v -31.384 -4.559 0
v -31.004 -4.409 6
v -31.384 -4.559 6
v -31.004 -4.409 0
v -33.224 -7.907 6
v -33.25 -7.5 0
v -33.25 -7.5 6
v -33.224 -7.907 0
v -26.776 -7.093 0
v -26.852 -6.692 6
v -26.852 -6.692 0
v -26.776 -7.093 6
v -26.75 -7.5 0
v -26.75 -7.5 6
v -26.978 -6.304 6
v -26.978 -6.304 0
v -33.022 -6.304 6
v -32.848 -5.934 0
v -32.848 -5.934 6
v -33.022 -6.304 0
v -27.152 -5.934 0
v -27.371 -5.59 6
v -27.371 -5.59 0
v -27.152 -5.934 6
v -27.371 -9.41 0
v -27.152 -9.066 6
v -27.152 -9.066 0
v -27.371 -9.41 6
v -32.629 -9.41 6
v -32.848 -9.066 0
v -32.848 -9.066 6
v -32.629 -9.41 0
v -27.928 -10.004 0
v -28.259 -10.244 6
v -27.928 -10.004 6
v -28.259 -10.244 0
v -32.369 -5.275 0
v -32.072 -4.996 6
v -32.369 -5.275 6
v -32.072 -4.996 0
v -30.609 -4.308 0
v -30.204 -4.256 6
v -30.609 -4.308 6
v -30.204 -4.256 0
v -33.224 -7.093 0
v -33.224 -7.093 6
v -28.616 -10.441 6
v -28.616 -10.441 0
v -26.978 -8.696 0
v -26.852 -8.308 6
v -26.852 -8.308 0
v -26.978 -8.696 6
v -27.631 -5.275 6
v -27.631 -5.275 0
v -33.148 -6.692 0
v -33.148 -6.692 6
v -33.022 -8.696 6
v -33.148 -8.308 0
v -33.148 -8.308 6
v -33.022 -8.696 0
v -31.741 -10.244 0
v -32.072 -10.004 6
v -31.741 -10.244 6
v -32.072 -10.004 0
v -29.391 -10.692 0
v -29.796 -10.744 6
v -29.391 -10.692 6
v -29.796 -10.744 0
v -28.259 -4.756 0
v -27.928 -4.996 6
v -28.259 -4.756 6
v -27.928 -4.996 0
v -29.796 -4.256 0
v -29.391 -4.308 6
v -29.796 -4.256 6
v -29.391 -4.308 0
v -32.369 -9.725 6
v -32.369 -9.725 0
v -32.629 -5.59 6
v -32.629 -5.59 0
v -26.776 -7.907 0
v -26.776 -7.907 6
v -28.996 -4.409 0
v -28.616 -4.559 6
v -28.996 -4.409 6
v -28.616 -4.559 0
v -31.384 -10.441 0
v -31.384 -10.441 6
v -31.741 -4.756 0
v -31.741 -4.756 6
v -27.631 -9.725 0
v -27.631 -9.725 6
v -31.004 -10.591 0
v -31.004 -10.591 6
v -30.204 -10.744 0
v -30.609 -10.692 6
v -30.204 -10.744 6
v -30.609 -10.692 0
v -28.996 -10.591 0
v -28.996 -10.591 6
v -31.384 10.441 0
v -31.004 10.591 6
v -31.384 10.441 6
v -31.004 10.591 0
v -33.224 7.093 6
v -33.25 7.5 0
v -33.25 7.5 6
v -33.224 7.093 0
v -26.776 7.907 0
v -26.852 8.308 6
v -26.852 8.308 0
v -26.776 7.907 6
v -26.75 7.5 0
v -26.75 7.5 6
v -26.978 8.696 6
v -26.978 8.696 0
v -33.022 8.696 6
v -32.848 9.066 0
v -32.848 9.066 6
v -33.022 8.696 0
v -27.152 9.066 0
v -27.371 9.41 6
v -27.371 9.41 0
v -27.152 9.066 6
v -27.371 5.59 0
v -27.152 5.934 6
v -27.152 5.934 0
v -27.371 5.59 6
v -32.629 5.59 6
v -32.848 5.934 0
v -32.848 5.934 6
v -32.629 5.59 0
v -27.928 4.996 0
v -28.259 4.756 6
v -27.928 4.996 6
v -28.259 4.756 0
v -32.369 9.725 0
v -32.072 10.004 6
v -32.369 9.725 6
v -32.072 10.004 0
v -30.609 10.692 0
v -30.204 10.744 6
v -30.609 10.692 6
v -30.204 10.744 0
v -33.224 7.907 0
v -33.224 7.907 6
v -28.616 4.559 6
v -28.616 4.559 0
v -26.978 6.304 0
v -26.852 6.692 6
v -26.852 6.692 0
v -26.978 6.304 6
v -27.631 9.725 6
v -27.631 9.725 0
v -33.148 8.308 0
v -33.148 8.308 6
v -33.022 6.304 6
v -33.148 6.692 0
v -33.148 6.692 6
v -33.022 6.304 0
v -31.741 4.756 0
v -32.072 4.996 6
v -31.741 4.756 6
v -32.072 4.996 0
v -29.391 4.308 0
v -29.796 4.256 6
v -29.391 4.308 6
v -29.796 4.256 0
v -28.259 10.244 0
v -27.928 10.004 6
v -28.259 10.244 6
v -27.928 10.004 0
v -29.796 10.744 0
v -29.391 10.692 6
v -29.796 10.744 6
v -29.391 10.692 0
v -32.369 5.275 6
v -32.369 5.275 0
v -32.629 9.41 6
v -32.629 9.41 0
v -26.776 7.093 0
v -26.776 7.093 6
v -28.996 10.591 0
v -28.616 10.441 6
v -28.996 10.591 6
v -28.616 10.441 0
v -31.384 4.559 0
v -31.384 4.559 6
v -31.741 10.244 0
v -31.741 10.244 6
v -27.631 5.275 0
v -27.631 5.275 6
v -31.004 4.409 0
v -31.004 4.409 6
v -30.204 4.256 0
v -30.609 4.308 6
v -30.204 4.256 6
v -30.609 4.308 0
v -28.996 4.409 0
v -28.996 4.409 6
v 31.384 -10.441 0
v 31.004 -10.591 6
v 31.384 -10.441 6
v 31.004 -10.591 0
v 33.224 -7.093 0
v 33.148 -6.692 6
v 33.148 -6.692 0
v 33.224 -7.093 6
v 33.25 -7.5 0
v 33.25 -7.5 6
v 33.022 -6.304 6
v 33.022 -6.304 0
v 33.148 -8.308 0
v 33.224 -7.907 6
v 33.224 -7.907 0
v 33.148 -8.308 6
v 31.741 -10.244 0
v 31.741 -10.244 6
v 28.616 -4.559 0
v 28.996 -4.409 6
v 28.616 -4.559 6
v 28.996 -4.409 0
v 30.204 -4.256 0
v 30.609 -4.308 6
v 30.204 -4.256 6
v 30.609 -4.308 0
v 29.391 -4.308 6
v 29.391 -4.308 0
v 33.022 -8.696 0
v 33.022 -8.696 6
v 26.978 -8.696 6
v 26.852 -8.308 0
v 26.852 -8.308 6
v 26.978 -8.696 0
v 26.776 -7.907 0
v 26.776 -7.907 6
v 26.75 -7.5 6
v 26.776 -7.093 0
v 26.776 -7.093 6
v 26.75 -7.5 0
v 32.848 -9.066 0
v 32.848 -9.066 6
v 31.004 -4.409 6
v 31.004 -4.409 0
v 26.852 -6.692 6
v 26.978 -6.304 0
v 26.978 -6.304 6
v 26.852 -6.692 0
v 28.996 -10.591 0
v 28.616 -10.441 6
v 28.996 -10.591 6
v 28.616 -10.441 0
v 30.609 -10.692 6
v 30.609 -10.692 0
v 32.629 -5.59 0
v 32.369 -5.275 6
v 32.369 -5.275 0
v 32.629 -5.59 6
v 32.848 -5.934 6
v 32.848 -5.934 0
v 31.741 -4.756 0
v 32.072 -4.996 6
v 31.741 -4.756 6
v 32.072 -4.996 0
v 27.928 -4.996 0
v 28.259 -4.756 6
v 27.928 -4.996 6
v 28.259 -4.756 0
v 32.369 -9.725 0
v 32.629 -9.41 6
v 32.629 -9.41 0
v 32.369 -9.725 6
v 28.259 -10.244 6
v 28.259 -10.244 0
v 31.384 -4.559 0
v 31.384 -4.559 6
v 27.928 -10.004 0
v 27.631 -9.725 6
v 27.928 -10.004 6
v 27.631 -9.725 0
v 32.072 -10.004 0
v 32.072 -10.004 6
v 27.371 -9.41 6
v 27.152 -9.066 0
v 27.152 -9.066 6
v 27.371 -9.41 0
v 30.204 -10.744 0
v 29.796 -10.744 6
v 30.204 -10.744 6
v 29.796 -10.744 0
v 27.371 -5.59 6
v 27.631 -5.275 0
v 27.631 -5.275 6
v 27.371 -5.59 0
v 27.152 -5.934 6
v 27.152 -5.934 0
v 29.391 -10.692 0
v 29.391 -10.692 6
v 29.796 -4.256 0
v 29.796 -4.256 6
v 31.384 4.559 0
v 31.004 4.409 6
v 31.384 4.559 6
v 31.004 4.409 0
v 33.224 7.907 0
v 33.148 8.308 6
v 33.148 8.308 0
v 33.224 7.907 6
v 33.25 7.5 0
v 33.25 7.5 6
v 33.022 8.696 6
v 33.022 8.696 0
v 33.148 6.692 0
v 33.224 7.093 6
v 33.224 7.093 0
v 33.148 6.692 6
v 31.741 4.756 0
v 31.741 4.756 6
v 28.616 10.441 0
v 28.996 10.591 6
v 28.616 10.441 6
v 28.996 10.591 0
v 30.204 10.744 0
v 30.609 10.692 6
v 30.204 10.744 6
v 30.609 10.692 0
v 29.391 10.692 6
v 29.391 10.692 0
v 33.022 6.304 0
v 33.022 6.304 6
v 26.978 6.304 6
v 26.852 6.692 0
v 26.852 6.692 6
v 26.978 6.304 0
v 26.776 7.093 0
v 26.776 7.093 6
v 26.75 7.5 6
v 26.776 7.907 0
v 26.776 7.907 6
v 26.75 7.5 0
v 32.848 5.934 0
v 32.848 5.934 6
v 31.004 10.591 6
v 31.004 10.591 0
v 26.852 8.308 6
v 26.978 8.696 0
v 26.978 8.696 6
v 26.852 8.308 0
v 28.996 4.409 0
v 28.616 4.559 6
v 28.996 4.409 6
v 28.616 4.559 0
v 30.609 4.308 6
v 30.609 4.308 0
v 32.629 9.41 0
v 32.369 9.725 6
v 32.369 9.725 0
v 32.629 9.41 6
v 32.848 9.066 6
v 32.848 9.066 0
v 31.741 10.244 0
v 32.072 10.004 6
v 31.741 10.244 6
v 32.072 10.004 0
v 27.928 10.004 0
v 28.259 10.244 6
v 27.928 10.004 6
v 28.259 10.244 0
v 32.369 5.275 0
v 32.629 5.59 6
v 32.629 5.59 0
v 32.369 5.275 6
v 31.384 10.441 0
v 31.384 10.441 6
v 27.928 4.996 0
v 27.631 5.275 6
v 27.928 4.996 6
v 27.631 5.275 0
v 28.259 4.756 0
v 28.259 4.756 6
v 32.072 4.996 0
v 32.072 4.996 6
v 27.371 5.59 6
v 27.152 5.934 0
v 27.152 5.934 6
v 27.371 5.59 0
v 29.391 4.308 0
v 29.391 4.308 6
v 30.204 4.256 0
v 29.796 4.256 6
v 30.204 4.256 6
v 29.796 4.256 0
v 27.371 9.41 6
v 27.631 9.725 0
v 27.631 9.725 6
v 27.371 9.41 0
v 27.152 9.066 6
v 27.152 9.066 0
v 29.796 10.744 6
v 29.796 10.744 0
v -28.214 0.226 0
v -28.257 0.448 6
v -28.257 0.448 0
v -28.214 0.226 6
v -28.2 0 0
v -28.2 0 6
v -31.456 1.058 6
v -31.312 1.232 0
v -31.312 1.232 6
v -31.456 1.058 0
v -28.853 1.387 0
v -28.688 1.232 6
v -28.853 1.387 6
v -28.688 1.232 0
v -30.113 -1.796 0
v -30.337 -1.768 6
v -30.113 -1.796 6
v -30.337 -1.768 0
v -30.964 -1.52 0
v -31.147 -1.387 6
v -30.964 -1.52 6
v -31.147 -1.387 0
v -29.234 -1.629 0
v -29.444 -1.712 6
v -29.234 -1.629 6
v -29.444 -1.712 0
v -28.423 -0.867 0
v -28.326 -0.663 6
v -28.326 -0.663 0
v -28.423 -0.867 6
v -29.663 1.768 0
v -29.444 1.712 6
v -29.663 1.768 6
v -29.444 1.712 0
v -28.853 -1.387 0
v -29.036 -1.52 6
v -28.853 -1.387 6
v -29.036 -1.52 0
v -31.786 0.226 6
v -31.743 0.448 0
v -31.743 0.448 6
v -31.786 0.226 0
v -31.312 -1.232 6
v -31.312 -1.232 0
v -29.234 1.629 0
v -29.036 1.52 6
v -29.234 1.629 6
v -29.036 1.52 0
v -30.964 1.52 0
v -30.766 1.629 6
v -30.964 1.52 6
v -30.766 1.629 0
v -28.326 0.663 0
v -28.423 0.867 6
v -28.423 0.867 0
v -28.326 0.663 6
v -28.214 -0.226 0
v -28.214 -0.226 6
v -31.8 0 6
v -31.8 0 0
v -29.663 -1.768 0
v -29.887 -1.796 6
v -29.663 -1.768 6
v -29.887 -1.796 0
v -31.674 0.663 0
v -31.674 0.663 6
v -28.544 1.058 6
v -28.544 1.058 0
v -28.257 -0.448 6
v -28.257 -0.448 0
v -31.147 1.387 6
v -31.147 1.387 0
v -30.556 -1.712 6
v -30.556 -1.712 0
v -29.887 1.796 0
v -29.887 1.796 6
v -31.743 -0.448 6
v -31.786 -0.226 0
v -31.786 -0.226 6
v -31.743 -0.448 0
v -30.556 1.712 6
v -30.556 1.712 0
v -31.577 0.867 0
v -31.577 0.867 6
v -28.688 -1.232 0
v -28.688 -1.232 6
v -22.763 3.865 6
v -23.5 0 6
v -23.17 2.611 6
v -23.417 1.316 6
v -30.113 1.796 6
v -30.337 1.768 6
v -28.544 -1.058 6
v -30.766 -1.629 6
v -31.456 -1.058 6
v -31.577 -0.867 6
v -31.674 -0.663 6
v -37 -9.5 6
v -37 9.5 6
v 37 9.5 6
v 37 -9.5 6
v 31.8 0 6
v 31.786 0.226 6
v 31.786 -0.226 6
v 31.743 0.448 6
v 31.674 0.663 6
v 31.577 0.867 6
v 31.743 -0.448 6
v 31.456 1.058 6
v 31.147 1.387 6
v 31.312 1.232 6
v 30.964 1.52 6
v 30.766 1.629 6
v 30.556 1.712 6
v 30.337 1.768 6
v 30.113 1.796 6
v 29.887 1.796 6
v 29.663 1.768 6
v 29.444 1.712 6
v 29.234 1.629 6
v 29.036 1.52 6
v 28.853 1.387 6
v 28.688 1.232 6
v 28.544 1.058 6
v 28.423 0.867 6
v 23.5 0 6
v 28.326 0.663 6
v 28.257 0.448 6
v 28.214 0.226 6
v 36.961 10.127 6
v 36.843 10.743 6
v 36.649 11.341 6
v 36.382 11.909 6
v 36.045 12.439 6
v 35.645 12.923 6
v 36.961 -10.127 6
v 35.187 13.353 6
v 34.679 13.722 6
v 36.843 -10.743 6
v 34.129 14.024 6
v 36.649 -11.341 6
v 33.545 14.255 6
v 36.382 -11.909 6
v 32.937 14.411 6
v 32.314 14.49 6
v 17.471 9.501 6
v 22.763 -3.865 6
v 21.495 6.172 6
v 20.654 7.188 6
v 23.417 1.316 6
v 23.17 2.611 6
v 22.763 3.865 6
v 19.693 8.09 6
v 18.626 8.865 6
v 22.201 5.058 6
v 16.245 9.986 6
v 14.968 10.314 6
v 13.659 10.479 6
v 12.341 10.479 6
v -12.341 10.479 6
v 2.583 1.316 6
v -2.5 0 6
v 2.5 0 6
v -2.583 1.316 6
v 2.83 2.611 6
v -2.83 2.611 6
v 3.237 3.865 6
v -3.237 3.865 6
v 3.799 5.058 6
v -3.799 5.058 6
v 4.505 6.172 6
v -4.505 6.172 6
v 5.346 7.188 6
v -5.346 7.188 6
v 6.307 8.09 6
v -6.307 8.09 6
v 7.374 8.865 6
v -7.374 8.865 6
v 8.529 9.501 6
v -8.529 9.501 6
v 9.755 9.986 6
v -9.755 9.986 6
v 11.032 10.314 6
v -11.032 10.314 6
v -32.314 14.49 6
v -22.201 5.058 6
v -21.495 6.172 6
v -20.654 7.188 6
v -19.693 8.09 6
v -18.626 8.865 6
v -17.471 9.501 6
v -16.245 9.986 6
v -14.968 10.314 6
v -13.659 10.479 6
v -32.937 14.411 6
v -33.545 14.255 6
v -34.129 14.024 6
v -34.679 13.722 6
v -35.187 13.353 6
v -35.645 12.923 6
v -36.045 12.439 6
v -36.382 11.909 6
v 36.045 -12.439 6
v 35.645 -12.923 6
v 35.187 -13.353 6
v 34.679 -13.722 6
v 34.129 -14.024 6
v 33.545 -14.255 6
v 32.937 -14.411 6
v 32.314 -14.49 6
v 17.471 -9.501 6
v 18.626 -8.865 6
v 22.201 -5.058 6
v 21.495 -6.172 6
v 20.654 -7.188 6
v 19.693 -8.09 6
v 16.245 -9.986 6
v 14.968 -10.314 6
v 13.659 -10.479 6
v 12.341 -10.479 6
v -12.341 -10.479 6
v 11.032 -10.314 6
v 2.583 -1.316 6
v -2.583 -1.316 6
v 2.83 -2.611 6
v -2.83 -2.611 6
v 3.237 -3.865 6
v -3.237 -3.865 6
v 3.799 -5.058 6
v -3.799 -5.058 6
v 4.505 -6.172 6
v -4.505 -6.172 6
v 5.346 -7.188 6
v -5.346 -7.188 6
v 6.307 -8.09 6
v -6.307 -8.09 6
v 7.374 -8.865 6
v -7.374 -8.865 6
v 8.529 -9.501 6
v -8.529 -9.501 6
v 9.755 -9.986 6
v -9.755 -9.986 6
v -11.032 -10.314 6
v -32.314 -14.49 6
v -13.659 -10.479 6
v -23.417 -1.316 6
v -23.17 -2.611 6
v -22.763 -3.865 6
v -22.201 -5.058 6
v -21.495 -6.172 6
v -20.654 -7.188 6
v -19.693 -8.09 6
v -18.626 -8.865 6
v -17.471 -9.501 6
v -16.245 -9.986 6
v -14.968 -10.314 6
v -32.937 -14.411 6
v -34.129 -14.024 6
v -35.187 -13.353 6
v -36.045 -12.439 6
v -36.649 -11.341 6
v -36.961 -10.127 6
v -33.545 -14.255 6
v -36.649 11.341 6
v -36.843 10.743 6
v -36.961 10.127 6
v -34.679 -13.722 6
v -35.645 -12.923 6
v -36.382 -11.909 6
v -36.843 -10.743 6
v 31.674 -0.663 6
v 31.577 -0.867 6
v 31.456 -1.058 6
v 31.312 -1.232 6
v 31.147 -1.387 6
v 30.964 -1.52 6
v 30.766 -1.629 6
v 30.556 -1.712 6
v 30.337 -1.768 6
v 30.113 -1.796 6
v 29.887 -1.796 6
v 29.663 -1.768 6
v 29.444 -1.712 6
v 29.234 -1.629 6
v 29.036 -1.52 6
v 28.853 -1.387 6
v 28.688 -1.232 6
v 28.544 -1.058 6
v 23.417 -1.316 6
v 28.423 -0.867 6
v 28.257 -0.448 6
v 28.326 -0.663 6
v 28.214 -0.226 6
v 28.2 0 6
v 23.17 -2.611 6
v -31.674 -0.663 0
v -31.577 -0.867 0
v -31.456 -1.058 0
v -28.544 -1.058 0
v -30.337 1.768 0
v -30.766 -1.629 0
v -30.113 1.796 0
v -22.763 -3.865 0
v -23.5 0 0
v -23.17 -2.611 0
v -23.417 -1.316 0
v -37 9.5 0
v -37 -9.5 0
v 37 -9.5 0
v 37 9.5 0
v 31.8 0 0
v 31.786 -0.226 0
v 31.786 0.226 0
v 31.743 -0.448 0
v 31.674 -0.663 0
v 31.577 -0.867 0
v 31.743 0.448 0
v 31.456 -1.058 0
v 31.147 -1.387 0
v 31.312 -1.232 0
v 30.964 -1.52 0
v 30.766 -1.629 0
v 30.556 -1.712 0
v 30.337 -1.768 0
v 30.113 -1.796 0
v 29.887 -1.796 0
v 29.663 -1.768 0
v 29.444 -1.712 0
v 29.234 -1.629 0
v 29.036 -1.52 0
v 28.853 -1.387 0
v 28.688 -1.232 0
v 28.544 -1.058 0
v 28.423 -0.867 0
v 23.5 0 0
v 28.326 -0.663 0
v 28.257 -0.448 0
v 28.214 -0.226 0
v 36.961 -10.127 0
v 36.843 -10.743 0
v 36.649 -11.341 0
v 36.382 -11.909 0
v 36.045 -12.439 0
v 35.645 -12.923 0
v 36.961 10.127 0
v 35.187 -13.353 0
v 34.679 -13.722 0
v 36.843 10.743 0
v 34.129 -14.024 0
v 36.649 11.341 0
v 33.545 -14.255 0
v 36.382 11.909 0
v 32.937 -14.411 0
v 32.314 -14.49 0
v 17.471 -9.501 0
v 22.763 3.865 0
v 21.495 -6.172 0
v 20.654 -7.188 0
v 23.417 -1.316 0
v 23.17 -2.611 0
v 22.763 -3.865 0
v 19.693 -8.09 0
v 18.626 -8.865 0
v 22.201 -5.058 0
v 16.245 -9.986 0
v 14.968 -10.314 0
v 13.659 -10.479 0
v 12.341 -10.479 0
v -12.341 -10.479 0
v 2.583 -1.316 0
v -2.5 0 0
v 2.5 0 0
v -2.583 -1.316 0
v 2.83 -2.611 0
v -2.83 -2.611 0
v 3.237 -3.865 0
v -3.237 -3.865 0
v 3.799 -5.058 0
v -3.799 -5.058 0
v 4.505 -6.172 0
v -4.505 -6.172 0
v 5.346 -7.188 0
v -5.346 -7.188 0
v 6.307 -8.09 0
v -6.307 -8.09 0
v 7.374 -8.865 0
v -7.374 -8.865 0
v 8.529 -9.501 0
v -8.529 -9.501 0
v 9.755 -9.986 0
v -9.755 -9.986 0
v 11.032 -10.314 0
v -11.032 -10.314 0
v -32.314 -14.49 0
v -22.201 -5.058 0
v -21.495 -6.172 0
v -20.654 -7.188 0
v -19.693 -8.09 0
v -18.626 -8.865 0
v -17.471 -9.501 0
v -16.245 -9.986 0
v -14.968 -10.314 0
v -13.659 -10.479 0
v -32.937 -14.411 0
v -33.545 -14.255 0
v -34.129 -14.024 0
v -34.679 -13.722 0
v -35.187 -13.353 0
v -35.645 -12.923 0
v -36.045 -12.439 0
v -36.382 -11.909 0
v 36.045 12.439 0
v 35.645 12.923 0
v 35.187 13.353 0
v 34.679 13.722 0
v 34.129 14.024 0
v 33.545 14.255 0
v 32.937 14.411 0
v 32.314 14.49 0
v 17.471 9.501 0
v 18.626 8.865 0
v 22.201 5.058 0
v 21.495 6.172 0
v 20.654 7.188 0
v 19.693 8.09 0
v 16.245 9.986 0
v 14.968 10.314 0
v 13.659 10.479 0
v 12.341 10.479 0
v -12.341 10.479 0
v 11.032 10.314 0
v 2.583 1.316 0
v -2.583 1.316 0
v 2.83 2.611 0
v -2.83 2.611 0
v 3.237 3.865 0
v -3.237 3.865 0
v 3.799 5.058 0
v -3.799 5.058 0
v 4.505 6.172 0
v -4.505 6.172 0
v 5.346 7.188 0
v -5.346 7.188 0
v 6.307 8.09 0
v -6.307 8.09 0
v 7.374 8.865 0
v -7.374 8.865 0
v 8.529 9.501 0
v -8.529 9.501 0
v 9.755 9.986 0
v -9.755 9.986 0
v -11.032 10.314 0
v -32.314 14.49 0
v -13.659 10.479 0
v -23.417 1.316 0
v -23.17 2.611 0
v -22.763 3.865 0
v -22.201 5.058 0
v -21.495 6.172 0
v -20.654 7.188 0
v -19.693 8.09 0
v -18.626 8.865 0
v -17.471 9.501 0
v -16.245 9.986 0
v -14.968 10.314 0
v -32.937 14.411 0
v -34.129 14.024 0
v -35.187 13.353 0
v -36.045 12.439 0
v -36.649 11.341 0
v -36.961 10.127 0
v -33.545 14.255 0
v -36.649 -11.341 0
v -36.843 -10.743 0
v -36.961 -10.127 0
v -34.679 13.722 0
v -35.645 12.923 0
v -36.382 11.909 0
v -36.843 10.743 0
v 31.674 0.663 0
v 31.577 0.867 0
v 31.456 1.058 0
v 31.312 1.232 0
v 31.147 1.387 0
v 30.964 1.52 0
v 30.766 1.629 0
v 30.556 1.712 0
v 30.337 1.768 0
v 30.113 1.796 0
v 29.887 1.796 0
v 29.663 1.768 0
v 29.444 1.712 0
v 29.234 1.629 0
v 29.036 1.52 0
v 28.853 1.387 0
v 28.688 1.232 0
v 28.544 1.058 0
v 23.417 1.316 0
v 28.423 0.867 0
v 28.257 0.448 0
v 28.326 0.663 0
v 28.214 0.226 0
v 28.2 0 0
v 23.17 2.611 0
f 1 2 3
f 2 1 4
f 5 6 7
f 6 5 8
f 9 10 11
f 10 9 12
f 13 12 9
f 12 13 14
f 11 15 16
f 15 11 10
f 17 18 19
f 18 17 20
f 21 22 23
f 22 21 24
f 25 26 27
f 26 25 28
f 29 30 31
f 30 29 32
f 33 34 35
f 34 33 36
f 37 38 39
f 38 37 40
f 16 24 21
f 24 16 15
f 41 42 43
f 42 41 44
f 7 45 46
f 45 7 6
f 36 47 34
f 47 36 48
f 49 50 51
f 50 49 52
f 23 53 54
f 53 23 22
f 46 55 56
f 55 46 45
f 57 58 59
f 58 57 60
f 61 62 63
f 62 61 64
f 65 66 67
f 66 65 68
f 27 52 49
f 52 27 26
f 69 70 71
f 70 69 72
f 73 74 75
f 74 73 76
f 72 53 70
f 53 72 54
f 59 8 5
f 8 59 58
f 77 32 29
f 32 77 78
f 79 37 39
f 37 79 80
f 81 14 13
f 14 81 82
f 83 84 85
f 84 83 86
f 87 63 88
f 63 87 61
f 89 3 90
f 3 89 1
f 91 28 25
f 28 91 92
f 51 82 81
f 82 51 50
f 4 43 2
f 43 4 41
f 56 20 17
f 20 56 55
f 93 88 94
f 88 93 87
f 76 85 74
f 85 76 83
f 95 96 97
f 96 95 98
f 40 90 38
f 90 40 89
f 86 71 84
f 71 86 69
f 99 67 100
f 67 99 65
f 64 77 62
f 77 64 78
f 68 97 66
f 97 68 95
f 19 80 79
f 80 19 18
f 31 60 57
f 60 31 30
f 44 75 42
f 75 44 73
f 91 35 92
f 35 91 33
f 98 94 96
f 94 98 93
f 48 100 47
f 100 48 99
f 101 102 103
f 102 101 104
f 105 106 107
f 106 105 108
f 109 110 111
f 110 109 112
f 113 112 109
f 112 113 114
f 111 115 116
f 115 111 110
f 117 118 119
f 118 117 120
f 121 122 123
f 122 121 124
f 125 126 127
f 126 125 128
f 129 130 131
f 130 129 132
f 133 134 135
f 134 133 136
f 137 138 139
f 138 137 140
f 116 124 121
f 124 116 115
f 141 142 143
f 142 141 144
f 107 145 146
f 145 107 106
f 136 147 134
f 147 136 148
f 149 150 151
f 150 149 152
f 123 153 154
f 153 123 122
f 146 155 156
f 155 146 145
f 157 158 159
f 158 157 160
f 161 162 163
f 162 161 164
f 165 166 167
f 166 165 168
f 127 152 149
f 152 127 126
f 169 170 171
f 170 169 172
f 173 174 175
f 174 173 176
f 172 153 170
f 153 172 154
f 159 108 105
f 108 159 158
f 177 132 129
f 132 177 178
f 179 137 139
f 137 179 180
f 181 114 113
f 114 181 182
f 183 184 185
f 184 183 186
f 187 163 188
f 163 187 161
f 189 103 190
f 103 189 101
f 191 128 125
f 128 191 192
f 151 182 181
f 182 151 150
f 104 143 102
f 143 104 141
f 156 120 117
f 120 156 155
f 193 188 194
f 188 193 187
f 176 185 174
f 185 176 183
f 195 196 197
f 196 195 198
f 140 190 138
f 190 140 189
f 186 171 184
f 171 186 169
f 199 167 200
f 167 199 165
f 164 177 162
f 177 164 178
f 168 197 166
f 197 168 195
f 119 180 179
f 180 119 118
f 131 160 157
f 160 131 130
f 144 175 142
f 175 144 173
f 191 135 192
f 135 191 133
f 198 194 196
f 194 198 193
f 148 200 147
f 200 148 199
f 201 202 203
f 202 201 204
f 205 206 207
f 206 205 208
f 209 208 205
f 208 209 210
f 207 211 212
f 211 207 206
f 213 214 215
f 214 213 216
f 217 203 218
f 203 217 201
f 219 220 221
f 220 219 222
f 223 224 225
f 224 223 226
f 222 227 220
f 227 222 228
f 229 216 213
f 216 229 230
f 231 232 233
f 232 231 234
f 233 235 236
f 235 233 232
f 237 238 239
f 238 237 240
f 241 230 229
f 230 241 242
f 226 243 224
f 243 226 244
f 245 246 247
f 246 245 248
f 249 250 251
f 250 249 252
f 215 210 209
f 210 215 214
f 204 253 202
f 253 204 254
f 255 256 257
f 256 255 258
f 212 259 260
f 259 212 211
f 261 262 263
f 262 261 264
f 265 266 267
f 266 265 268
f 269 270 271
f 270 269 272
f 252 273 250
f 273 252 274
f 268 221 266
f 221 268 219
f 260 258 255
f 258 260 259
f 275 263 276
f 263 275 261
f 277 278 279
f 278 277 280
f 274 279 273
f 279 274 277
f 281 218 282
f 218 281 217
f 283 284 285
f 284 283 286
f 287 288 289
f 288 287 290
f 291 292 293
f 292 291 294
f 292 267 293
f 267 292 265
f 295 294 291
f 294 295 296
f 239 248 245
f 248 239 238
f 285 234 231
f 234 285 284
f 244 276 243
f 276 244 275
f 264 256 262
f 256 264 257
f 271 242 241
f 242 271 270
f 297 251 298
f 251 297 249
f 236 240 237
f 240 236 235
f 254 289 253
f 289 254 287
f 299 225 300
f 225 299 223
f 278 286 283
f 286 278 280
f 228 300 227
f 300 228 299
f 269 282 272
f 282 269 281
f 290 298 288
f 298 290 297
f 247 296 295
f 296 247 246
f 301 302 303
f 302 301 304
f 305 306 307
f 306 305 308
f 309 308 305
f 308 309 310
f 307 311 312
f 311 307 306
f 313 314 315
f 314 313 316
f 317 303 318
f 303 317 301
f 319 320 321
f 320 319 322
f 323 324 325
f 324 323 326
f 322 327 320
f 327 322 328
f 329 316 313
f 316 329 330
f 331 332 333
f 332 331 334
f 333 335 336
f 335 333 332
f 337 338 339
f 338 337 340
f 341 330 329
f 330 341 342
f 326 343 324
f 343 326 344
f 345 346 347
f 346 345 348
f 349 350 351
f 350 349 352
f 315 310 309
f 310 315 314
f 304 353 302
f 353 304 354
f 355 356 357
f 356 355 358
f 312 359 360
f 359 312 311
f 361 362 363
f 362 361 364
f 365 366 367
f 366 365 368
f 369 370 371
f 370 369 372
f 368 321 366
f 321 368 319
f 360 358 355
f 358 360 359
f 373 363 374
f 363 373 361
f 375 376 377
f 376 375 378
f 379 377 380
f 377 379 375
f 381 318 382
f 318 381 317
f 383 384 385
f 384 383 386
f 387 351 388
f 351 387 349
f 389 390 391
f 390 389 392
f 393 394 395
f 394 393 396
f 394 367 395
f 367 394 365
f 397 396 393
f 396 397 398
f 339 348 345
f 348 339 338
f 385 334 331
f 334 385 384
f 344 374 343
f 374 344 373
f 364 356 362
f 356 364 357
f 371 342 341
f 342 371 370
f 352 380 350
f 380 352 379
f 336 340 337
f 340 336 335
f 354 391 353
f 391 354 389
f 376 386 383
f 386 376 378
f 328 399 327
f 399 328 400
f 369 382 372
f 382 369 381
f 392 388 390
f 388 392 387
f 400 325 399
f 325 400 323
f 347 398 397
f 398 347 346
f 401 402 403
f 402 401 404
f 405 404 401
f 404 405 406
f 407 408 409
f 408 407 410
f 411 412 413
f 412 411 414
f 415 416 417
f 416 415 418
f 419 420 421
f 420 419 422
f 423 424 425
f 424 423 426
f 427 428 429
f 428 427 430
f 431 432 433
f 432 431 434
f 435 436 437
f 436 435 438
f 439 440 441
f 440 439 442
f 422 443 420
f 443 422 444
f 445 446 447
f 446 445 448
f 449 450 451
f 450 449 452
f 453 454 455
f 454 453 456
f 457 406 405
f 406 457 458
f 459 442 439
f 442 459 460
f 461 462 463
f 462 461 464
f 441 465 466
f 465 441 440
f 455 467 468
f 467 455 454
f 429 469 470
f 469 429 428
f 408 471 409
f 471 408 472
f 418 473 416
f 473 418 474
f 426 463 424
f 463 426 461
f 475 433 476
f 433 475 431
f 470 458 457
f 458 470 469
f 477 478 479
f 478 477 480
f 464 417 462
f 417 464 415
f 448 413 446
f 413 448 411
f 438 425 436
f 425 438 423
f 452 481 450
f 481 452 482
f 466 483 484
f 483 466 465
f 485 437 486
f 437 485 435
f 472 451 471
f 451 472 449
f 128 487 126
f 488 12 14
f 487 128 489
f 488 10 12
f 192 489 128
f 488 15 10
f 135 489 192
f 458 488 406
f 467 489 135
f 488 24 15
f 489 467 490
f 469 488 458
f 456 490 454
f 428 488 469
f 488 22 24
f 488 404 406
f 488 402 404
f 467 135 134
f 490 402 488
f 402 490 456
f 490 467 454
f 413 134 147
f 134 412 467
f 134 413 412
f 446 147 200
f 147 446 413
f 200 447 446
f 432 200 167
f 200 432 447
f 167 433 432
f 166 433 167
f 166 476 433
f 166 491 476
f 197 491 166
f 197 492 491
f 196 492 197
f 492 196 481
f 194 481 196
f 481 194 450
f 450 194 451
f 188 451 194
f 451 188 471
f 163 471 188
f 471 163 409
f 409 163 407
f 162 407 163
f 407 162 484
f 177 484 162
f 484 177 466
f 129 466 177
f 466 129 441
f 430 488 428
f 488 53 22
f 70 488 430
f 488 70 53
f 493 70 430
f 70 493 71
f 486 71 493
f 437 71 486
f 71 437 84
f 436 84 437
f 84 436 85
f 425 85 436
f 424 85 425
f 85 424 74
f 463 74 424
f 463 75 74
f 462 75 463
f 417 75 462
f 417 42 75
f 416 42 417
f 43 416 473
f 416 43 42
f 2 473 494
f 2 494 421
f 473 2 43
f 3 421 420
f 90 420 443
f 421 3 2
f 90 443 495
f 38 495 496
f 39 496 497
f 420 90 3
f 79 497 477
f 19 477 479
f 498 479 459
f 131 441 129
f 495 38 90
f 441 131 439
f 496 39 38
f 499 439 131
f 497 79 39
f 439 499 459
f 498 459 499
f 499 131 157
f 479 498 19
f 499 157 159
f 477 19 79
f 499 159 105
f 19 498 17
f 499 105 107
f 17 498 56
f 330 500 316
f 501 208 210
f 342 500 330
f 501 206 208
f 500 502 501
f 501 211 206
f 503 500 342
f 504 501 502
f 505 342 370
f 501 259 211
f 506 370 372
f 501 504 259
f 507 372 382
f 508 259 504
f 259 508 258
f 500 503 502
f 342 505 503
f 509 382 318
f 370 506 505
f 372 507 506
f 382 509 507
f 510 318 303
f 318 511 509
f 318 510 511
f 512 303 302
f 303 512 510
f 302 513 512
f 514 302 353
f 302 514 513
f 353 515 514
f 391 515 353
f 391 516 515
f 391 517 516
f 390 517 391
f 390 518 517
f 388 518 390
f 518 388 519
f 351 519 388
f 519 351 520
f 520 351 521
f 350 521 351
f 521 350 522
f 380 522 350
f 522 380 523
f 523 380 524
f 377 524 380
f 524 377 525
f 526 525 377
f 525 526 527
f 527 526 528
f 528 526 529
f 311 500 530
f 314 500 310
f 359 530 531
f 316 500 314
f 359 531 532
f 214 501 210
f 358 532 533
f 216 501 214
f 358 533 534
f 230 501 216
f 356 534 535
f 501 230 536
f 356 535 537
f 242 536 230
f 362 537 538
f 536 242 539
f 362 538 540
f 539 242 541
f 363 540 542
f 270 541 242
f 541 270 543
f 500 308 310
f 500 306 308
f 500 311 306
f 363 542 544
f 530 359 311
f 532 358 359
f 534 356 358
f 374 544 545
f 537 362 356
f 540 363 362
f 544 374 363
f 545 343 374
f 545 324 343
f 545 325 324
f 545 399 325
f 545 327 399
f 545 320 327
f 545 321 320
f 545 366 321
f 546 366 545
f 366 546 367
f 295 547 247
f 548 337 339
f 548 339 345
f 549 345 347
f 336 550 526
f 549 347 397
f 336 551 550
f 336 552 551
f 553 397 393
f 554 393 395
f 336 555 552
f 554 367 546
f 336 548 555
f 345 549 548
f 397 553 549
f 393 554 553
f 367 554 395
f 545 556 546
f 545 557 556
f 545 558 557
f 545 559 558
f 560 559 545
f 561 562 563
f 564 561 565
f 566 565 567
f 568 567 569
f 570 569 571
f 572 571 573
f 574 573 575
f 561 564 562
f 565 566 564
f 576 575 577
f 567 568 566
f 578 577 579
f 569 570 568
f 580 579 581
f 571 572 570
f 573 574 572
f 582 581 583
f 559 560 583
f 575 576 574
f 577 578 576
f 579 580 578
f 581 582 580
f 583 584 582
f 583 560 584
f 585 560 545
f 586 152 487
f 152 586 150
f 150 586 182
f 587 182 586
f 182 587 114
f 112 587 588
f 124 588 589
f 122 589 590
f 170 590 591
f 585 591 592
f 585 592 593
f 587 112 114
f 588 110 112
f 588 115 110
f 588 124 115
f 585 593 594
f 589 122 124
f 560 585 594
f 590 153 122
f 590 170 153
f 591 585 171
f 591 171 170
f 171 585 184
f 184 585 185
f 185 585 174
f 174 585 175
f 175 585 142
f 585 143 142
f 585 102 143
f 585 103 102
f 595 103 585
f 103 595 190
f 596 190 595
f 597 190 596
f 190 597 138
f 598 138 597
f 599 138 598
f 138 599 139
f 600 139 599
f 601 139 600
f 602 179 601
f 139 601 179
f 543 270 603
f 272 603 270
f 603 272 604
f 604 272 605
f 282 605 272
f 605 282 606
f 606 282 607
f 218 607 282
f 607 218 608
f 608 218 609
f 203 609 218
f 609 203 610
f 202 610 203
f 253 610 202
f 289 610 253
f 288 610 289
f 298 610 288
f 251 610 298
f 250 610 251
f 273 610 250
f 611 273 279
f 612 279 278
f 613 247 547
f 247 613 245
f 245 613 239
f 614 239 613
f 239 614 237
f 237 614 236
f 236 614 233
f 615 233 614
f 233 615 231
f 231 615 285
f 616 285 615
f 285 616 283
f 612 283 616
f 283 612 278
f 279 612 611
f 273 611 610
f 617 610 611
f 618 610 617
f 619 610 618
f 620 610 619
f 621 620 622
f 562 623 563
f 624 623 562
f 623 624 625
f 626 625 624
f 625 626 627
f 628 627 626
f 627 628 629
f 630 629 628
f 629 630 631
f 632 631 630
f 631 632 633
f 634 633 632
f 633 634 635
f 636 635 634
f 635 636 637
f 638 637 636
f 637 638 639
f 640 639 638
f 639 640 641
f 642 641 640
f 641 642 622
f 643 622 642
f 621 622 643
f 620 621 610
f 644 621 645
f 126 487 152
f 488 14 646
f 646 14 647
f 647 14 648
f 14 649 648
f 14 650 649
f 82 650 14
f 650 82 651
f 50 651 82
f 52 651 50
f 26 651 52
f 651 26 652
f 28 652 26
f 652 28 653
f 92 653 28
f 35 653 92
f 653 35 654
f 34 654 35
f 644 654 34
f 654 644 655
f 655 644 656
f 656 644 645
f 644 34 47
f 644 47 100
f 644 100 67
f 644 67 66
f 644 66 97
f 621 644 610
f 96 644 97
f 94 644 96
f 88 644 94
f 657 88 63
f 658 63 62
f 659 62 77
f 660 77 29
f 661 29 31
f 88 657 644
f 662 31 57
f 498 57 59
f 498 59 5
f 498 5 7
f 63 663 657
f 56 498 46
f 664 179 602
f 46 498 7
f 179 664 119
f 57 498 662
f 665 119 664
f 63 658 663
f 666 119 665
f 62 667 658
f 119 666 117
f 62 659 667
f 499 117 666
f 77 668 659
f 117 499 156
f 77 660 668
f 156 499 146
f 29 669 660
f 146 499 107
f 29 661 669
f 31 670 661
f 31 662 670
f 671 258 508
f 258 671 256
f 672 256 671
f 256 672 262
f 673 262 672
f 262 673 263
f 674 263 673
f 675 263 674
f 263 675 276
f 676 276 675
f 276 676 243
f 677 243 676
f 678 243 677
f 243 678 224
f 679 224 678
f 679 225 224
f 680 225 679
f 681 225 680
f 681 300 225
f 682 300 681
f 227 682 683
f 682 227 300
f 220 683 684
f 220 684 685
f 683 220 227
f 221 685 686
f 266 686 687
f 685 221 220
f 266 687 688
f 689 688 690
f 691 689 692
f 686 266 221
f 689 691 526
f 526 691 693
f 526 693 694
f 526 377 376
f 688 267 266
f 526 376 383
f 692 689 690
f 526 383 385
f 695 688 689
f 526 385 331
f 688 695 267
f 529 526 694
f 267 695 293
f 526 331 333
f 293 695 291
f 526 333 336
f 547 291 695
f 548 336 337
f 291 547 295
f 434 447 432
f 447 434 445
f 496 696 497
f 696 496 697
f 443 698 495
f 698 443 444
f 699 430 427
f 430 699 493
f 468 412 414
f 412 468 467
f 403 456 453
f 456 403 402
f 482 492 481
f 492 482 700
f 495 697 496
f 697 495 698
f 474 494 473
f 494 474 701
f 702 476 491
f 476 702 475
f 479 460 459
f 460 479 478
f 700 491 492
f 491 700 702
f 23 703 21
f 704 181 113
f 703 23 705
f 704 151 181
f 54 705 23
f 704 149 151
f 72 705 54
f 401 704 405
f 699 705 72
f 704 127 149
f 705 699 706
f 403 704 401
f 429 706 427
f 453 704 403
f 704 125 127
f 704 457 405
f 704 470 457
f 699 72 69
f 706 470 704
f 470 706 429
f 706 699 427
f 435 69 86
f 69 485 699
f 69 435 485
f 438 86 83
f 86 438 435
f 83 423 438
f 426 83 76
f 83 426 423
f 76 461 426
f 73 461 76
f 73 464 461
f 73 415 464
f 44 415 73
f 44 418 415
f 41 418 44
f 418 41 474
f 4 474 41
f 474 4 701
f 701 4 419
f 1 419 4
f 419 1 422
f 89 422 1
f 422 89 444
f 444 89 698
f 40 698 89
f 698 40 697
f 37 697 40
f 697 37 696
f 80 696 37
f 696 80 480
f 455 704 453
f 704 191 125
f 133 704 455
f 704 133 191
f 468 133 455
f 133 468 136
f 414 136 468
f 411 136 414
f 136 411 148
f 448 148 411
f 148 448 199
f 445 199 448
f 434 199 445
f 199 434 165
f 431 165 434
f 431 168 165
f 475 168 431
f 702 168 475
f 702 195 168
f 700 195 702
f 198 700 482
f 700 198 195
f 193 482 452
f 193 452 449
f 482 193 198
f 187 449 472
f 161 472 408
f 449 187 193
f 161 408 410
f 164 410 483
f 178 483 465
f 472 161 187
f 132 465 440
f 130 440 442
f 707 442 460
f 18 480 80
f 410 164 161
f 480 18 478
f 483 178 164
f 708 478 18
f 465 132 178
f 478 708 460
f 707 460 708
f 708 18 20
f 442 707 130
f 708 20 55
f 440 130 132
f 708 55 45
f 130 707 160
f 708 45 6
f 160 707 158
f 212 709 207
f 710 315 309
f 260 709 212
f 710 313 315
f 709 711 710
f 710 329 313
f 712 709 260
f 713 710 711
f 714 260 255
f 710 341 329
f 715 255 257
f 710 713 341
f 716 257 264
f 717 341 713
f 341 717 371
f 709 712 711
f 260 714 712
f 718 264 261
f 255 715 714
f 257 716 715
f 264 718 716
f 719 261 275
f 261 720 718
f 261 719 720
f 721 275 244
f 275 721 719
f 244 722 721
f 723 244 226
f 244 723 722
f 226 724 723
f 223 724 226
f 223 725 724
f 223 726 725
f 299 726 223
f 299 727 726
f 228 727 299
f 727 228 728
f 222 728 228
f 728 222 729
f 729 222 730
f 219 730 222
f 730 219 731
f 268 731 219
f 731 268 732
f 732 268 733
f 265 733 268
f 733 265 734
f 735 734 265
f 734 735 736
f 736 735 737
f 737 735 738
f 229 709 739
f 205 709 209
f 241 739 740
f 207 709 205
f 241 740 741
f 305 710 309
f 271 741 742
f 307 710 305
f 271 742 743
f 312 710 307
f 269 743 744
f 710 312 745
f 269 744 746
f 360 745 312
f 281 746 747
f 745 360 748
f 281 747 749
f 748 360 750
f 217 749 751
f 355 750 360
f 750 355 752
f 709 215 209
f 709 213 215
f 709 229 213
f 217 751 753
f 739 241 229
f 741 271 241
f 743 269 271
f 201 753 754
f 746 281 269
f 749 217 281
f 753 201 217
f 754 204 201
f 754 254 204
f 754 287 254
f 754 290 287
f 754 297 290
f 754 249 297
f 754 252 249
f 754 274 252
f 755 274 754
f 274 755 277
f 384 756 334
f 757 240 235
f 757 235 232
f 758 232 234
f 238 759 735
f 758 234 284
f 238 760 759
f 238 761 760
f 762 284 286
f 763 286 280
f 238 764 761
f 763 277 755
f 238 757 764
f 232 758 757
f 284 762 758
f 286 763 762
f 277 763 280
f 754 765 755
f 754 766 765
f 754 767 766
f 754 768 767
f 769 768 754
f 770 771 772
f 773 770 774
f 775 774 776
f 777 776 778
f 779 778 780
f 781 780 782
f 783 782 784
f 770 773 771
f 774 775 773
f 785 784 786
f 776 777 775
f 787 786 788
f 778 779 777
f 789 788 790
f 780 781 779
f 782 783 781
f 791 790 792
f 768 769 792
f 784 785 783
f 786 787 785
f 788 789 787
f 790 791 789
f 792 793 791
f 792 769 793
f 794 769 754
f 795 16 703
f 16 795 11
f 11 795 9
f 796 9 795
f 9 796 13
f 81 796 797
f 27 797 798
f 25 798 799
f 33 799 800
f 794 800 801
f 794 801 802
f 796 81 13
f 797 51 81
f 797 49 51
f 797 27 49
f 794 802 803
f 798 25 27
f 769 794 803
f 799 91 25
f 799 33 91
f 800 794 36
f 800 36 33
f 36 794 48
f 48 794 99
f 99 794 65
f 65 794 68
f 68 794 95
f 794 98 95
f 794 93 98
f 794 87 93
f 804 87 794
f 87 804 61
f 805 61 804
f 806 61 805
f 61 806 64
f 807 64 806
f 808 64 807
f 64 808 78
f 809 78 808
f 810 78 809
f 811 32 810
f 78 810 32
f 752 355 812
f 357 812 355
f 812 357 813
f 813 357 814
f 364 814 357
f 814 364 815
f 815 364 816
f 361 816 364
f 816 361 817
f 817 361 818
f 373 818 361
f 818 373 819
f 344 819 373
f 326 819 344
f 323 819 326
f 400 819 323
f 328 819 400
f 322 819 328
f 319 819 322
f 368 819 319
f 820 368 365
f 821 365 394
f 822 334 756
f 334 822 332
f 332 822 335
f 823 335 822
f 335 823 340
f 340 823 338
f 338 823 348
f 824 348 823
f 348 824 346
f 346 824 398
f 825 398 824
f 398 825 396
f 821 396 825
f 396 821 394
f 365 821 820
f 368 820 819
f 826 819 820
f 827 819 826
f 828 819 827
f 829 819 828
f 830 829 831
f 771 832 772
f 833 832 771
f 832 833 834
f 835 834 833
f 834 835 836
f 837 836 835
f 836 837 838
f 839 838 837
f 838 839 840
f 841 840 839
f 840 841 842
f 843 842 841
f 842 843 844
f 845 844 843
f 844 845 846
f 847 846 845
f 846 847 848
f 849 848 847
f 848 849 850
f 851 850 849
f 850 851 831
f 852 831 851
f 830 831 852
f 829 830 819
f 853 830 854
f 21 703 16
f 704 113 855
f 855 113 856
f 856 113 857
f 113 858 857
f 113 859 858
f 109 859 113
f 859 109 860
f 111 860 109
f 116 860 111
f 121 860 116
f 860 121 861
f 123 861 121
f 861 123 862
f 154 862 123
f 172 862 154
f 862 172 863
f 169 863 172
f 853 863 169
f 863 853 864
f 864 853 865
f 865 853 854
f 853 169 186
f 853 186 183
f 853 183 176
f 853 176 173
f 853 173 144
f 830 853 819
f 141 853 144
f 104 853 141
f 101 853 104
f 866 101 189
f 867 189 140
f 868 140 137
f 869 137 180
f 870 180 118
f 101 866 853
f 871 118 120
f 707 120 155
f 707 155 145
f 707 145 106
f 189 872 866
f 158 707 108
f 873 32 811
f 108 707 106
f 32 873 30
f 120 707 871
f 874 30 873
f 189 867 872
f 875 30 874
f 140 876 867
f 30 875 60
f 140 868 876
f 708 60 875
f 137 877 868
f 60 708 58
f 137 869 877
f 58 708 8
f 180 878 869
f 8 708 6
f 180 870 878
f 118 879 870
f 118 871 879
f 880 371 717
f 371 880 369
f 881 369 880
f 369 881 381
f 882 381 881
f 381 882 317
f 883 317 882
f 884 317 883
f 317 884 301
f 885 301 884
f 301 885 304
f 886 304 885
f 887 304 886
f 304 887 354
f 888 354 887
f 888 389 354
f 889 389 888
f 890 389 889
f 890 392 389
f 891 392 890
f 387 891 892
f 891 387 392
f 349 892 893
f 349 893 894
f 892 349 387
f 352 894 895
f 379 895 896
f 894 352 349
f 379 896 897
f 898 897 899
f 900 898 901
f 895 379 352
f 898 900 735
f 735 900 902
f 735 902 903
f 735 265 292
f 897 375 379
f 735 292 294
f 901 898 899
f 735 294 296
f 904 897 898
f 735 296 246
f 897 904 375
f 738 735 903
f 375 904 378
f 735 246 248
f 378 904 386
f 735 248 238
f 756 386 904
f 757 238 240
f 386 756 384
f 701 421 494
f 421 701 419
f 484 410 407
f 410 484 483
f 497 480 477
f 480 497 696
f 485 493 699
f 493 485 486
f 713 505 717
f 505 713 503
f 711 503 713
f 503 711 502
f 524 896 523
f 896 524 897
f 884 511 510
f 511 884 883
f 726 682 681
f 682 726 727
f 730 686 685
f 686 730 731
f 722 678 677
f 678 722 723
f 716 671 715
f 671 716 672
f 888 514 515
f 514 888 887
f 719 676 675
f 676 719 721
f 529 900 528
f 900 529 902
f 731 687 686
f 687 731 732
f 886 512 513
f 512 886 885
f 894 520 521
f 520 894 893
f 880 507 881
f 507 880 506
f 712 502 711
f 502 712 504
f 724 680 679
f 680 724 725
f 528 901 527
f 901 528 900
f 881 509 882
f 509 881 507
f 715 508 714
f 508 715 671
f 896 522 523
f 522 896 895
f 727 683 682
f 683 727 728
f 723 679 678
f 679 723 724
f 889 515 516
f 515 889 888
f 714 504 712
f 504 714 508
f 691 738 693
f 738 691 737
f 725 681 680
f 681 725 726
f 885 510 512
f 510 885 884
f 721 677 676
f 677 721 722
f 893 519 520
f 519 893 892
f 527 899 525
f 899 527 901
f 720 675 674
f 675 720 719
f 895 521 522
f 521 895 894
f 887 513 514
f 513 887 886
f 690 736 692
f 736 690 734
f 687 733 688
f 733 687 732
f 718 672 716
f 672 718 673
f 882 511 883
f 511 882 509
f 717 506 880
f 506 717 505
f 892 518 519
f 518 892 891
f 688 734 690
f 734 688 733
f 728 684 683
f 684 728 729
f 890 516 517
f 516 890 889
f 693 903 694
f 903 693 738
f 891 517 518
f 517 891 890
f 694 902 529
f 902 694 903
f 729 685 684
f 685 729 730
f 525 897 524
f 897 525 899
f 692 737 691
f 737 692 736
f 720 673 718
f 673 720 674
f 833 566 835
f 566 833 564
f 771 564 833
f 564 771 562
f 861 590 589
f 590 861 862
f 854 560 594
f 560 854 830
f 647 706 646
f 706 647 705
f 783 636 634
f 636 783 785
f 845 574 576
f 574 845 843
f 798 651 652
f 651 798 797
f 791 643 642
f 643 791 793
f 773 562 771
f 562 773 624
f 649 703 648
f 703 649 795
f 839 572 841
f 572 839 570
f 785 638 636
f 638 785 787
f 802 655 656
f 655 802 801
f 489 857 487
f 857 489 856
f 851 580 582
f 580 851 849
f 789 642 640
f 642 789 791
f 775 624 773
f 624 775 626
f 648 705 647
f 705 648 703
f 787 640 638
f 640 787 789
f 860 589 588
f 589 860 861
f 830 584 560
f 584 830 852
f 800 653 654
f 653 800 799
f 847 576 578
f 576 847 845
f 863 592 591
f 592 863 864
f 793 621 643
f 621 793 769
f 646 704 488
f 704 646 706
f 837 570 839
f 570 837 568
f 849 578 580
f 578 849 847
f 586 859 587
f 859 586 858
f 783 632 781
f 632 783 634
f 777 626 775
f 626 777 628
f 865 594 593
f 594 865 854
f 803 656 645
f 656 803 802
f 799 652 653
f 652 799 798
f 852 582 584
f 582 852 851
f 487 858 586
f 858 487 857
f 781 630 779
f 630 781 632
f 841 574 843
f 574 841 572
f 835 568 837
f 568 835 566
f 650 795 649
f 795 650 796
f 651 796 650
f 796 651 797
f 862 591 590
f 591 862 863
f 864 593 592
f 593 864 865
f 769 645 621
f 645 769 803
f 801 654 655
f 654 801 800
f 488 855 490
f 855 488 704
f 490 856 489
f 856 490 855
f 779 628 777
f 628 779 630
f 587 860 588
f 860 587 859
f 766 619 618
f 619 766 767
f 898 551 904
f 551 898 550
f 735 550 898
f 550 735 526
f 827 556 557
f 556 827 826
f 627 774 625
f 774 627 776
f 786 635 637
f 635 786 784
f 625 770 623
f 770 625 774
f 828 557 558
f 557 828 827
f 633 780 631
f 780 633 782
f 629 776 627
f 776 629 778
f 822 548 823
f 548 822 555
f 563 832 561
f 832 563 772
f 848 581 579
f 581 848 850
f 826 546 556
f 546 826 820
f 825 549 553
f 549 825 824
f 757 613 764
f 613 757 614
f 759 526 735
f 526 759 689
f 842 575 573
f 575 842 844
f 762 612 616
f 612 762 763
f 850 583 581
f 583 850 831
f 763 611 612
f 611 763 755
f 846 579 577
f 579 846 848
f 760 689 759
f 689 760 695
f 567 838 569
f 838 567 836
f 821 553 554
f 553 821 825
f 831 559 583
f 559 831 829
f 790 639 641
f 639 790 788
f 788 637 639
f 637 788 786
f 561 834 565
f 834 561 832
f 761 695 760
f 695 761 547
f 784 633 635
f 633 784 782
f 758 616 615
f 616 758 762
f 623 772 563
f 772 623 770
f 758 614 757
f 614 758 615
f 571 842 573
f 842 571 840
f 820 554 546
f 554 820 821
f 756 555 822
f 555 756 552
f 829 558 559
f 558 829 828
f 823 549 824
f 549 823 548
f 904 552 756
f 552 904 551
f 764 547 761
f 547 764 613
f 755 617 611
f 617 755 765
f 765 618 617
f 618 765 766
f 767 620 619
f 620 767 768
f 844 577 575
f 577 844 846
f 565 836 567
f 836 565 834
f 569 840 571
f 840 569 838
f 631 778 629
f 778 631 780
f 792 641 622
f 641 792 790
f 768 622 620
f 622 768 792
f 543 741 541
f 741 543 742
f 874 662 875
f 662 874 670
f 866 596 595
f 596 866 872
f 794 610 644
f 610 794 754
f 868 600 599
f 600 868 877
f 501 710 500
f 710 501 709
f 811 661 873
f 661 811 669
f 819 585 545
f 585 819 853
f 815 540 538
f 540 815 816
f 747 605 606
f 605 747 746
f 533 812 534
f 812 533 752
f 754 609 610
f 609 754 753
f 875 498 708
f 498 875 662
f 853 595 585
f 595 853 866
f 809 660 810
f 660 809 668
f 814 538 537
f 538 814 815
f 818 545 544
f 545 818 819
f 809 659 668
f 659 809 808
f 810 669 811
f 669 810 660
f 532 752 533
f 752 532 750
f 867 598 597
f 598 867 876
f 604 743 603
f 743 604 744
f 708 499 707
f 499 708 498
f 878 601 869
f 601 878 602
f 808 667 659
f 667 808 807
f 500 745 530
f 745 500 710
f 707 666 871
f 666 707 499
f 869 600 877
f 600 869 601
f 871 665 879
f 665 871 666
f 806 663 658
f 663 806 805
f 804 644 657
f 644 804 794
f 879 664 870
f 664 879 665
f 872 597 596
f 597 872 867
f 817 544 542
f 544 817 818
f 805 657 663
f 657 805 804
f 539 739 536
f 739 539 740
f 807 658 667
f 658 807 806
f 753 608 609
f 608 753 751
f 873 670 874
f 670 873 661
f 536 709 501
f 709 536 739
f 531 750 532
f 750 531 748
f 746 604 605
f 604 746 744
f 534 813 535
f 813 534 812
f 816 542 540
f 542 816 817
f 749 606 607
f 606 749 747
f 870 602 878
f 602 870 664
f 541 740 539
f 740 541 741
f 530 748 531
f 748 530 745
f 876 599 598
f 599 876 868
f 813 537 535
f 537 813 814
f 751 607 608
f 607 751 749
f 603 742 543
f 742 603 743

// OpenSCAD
$fn = 50;


difference() {
	union() {
		hull() {
			translate(v = [-32.0000000000, 9.5000000000, 0]) {
				cylinder(h = 6, r = 5);
			}
			translate(v = [32.0000000000, 9.5000000000, 0]) {
				cylinder(h = 6, r = 5);
			}
			translate(v = [-32.0000000000, -9.5000000000, 0]) {
				cylinder(h = 6, r = 5);
			}
			translate(v = [32.0000000000, -9.5000000000, 0]) {
				cylinder(h = 6, r = 5);
			}
		}
	}
	union() {
		#translate(v = [-30.0000000000, -7.5000000000, 0]) {
			cylinder(h = 6, r = 3.2500000000);
		}
		#translate(v = [-30.0000000000, 7.5000000000, 0]) {
			cylinder(h = 6, r = 3.2500000000);
		}
		#translate(v = [30.0000000000, -7.5000000000, 0]) {
			cylinder(h = 6, r = 3.2500000000);
		}
		#translate(v = [30.0000000000, 7.5000000000, 0]) {
			cylinder(h = 6, r = 3.2500000000);
		}
		#translate(v = [-30.0000000000, -7.5000000000, -100.0000000000]) {
			cylinder(h = 200, r = 3.2500000000);
		}
		#translate(v = [-30.0000000000, 7.5000000000, -100.0000000000]) {
			cylinder(h = 200, r = 3.2500000000);
		}
		#translate(v = [30.0000000000, -7.5000000000, -100.0000000000]) {
			cylinder(h = 200, r = 3.2500000000);
		}
		#translate(v = [30.0000000000, 7.5000000000, -100.0000000000]) {
			cylinder(h = 200, r = 3.2500000000);
		}
		#translate(v = [-30.0000000000, -7.5000000000, 0]) {
			cylinder(h = 6, r = 1.8000000000);
		}
		#translate(v = [-30.0000000000, 0.0000000000, 0]) {
			cylinder(h = 6, r = 1.8000000000);
		}
		#translate(v = [-30.0000000000, 7.5000000000, 0]) {
			cylinder(h = 6, r = 1.8000000000);
		}
		#translate(v = [30.0000000000, -7.5000000000, 0]) {
			cylinder(h = 6, r = 1.8000000000);
		}
		#translate(v = [30.0000000000, 0.0000000000, 0]) {
			cylinder(h = 6, r = 1.8000000000);
		}
		#translate(v = [30.0000000000, 7.5000000000, 0]) {
			cylinder(h = 6, r = 1.8000000000);
		}
		#translate(v = [-30.0000000000, -7.5000000000, 0]) {
			cylinder(h = 6, r = 1.8000000000);
		}
		#translate(v = [-30.0000000000, 0.0000000000, 0]) {
			cylinder(h = 6, r = 1.8000000000);
		}
		#translate(v = [-30.0000000000, 7.5000000000, 0]) {
			cylinder(h = 6, r = 1.8000000000);
		}
		#translate(v = [30.0000000000, -7.5000000000, 0]) {
			cylinder(h = 6, r = 1.8000000000);
		}
		#translate(v = [30.0000000000, 0.0000000000, 0]) {
			cylinder(h = 6, r = 1.8000000000);
		}
		#translate(v = [30.0000000000, 7.5000000000, 0]) {
			cylinder(h = 6, r = 1.8000000000);
		}
		#translate(v = [-30.0000000000, -7.5000000000, 0]) {
			cylinder(h = 6, r = 1.8000000000);
		}
		#translate(v = [-30.0000000000, 0.0000000000, 0]) {
			cylinder(h = 6, r = 1.8000000000);
		}
		#translate(v = [-30.0000000000, 7.5000000000, 0]) {
			cylinder(h = 6, r = 1.8000000000);
		}
		#translate(v = [30.0000000000, -7.5000000000, 0]) {
			cylinder(h = 6, r = 1.8000000000);
		}
		#translate(v = [30.0000000000, 0.0000000000, 0]) {
			cylinder(h = 6, r = 1.8000000000);
		}
		#translate(v = [30.0000000000, 7.5000000000, 0]) {
			cylinder(h = 6, r = 1.8000000000);
		}
		#translate(v = [-13.0000000000, 0, 0]) {
			cylinder(h = 6, r = 10.5000000000);
		}
		#translate(v = [13.0000000000, 0, 0]) {
			cylinder(h = 6, r = 10.5000000000);
		}
	}
}
